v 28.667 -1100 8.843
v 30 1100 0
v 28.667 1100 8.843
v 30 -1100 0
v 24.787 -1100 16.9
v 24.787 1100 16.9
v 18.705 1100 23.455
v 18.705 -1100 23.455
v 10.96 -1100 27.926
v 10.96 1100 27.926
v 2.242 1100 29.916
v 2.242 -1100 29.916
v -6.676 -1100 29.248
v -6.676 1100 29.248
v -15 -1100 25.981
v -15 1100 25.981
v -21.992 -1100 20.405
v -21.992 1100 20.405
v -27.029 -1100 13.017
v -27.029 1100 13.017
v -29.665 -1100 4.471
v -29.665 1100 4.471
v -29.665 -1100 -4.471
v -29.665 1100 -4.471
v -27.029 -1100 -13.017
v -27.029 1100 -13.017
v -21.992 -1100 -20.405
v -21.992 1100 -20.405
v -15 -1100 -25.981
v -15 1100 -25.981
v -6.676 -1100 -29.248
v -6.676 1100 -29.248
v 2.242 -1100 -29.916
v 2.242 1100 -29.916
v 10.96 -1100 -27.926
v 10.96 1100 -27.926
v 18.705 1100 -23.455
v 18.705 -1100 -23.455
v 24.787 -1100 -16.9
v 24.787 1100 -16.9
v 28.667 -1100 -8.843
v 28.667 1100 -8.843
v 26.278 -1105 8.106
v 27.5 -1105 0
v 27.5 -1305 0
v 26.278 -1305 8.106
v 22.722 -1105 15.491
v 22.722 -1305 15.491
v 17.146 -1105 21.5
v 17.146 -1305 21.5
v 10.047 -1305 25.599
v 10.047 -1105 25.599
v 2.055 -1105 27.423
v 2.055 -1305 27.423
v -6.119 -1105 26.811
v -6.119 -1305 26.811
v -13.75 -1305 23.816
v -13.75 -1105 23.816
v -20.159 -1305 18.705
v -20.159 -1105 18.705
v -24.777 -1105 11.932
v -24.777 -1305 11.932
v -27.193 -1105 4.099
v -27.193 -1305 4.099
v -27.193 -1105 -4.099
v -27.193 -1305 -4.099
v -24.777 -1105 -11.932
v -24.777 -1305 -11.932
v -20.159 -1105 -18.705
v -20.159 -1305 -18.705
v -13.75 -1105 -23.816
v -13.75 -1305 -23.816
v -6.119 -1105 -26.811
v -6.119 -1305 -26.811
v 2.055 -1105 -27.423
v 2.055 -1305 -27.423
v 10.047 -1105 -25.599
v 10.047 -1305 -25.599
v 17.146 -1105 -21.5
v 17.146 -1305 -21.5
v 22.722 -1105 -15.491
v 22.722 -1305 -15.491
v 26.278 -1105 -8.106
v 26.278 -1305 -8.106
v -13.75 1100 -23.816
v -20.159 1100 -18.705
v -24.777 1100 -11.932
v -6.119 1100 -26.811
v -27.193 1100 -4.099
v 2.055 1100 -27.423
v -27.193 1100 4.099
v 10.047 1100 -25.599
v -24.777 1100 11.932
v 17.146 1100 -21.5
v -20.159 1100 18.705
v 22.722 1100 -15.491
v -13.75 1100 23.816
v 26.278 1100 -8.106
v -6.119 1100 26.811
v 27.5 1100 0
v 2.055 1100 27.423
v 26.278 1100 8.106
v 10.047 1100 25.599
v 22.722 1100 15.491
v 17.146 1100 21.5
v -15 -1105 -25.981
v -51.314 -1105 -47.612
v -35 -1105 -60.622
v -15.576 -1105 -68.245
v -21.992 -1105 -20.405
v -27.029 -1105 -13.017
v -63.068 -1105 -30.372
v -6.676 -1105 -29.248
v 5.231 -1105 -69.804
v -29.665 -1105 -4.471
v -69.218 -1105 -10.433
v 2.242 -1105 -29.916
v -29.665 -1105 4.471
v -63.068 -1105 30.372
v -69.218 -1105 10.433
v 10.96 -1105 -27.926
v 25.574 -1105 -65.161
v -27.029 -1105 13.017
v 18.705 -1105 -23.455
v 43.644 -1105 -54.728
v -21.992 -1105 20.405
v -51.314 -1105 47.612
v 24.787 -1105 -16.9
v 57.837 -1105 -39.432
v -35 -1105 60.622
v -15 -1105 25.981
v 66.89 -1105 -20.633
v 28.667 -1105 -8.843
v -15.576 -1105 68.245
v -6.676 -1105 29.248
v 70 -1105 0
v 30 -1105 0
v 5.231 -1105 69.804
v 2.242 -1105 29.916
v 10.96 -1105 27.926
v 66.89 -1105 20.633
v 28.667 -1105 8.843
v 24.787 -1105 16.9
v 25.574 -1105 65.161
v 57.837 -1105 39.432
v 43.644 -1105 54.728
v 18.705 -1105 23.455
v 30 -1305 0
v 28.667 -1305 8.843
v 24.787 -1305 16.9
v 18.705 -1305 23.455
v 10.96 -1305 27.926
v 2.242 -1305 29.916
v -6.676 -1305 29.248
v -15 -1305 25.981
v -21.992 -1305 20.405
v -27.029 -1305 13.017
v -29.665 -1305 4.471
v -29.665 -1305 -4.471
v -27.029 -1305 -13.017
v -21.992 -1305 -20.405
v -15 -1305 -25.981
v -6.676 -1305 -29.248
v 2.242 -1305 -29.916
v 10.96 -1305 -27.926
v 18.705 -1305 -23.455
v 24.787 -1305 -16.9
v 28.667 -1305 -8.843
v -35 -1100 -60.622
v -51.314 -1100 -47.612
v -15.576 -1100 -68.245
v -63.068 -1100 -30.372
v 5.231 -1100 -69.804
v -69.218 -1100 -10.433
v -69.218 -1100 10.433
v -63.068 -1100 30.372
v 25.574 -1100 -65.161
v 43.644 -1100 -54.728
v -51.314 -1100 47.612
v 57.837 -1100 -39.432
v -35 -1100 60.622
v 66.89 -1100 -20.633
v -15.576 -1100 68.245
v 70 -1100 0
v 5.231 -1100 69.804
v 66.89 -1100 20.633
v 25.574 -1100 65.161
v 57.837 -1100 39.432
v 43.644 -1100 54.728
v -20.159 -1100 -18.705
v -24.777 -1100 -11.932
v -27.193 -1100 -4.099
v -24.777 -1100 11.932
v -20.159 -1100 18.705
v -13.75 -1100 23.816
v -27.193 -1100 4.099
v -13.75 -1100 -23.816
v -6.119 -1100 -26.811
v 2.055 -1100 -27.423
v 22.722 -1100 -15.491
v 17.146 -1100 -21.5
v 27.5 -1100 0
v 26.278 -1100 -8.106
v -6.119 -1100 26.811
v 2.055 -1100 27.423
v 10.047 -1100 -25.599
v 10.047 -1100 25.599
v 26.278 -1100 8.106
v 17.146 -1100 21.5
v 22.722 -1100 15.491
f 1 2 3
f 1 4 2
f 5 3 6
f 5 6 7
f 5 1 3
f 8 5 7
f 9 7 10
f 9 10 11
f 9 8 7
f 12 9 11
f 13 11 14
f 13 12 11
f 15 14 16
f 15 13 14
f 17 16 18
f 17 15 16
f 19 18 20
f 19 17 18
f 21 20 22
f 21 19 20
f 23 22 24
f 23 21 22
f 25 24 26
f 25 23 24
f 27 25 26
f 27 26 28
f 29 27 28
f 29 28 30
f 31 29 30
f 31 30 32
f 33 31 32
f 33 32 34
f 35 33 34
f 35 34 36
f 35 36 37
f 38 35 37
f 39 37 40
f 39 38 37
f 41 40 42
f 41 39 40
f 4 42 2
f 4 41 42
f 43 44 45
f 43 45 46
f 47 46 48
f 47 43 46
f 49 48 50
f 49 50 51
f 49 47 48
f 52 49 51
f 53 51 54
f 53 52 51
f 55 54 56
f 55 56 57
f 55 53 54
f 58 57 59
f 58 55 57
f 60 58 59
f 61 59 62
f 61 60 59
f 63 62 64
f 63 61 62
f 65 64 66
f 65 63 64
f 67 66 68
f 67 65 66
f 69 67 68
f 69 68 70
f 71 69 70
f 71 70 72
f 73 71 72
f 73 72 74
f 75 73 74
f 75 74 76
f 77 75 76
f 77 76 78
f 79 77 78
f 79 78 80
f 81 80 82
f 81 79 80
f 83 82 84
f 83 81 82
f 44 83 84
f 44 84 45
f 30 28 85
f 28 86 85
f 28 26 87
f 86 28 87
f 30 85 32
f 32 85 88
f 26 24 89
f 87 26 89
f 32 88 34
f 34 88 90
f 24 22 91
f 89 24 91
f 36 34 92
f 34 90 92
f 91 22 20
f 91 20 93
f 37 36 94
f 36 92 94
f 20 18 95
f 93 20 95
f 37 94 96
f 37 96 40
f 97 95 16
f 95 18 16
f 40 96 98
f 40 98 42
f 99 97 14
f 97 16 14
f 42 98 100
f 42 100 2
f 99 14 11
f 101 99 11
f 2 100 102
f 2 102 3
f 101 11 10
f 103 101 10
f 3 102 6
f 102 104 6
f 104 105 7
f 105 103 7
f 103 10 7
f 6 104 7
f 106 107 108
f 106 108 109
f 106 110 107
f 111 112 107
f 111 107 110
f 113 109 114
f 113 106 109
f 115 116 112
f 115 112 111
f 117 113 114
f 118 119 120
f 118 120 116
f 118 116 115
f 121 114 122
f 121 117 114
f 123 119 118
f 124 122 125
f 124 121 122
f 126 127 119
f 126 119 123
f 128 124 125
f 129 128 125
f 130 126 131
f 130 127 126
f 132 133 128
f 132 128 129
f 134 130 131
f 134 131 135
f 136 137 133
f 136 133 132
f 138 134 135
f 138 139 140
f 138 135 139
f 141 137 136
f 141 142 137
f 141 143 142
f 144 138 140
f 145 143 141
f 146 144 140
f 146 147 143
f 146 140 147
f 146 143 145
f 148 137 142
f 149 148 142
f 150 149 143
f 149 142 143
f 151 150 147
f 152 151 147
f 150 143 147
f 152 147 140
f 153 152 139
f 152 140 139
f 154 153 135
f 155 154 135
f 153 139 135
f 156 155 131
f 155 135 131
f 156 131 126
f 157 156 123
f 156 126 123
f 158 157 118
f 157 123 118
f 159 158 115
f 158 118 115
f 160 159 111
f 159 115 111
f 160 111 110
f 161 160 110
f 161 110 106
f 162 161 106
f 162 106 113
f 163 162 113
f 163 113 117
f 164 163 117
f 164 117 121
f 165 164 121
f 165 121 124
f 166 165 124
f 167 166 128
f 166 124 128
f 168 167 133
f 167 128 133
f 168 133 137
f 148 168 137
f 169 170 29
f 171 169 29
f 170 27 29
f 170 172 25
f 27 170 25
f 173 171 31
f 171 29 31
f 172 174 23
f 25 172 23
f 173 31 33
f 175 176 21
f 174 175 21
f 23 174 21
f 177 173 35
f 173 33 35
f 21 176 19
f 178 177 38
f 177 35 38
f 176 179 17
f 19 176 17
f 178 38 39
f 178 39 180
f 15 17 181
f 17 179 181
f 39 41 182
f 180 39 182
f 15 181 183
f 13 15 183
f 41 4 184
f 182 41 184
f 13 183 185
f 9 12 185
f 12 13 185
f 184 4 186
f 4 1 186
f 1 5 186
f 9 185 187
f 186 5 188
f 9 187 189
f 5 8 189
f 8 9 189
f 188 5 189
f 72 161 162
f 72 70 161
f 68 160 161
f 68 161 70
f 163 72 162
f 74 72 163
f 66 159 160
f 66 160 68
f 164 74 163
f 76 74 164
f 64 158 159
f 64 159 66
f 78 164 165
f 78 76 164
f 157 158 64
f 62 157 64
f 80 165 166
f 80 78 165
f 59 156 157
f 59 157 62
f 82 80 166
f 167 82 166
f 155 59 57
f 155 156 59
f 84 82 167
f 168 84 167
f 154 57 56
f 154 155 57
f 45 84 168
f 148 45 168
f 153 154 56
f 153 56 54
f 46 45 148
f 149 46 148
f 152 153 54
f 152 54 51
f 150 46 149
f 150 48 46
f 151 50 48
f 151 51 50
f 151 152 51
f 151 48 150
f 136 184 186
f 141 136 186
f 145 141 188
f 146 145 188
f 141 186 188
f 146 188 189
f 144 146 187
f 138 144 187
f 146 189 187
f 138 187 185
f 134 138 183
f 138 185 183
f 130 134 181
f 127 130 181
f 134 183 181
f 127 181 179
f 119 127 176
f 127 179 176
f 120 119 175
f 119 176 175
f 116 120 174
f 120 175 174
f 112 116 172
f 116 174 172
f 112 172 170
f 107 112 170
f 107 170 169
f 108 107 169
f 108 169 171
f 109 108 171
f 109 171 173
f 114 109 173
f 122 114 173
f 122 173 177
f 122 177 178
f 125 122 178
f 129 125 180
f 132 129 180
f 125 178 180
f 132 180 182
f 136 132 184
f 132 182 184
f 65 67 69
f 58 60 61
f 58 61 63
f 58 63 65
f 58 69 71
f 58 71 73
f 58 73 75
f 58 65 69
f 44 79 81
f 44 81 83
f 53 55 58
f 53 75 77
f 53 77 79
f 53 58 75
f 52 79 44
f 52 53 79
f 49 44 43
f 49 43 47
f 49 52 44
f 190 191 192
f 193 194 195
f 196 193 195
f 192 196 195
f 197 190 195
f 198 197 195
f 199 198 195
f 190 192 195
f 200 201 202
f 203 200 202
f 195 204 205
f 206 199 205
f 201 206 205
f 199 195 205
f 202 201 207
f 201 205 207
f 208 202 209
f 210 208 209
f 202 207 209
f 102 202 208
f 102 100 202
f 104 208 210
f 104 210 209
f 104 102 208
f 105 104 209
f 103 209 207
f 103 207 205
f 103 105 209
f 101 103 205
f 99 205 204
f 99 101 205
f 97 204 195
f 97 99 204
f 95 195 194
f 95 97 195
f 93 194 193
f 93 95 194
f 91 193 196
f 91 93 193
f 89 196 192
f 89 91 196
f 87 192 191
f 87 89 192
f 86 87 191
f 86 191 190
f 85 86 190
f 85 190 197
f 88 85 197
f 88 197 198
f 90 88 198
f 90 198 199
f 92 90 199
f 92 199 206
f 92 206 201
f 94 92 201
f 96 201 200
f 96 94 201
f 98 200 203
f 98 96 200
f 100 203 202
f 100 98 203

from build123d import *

# Parameters (mm, degrees)
F0_R     = 30
F0_R_2   = 27.5
F1_DEPTH = 1100
F2_R     = 70
F3_DEPTH = 5
F4_R     = 30
F4_R_2   = 27.5
F5_DEPTH = 200


with BuildPart() as f1:
    # F0 (on Front) → F1 (new body, symmetric)
    with BuildSketch(Plane.XZ):
        Circle(F0_R)
        Circle(F0_R_2, mode=Mode.SUBTRACT)
    extrude(amount=F1_DEPTH, both=True)

    # F2 (on face) → F3 (join)
    with BuildSketch(Plane.XZ.offset(1100)):
        Circle(F2_R)
    extrude(amount=F3_DEPTH)

    # F4 (on face) → F5 (join)
    with BuildSketch(Plane.XZ.offset(1105)):
        Circle(F4_R)
        Circle(F4_R_2, mode=Mode.SUBTRACT)
    extrude(amount=F5_DEPTH)


solid = f1.part
